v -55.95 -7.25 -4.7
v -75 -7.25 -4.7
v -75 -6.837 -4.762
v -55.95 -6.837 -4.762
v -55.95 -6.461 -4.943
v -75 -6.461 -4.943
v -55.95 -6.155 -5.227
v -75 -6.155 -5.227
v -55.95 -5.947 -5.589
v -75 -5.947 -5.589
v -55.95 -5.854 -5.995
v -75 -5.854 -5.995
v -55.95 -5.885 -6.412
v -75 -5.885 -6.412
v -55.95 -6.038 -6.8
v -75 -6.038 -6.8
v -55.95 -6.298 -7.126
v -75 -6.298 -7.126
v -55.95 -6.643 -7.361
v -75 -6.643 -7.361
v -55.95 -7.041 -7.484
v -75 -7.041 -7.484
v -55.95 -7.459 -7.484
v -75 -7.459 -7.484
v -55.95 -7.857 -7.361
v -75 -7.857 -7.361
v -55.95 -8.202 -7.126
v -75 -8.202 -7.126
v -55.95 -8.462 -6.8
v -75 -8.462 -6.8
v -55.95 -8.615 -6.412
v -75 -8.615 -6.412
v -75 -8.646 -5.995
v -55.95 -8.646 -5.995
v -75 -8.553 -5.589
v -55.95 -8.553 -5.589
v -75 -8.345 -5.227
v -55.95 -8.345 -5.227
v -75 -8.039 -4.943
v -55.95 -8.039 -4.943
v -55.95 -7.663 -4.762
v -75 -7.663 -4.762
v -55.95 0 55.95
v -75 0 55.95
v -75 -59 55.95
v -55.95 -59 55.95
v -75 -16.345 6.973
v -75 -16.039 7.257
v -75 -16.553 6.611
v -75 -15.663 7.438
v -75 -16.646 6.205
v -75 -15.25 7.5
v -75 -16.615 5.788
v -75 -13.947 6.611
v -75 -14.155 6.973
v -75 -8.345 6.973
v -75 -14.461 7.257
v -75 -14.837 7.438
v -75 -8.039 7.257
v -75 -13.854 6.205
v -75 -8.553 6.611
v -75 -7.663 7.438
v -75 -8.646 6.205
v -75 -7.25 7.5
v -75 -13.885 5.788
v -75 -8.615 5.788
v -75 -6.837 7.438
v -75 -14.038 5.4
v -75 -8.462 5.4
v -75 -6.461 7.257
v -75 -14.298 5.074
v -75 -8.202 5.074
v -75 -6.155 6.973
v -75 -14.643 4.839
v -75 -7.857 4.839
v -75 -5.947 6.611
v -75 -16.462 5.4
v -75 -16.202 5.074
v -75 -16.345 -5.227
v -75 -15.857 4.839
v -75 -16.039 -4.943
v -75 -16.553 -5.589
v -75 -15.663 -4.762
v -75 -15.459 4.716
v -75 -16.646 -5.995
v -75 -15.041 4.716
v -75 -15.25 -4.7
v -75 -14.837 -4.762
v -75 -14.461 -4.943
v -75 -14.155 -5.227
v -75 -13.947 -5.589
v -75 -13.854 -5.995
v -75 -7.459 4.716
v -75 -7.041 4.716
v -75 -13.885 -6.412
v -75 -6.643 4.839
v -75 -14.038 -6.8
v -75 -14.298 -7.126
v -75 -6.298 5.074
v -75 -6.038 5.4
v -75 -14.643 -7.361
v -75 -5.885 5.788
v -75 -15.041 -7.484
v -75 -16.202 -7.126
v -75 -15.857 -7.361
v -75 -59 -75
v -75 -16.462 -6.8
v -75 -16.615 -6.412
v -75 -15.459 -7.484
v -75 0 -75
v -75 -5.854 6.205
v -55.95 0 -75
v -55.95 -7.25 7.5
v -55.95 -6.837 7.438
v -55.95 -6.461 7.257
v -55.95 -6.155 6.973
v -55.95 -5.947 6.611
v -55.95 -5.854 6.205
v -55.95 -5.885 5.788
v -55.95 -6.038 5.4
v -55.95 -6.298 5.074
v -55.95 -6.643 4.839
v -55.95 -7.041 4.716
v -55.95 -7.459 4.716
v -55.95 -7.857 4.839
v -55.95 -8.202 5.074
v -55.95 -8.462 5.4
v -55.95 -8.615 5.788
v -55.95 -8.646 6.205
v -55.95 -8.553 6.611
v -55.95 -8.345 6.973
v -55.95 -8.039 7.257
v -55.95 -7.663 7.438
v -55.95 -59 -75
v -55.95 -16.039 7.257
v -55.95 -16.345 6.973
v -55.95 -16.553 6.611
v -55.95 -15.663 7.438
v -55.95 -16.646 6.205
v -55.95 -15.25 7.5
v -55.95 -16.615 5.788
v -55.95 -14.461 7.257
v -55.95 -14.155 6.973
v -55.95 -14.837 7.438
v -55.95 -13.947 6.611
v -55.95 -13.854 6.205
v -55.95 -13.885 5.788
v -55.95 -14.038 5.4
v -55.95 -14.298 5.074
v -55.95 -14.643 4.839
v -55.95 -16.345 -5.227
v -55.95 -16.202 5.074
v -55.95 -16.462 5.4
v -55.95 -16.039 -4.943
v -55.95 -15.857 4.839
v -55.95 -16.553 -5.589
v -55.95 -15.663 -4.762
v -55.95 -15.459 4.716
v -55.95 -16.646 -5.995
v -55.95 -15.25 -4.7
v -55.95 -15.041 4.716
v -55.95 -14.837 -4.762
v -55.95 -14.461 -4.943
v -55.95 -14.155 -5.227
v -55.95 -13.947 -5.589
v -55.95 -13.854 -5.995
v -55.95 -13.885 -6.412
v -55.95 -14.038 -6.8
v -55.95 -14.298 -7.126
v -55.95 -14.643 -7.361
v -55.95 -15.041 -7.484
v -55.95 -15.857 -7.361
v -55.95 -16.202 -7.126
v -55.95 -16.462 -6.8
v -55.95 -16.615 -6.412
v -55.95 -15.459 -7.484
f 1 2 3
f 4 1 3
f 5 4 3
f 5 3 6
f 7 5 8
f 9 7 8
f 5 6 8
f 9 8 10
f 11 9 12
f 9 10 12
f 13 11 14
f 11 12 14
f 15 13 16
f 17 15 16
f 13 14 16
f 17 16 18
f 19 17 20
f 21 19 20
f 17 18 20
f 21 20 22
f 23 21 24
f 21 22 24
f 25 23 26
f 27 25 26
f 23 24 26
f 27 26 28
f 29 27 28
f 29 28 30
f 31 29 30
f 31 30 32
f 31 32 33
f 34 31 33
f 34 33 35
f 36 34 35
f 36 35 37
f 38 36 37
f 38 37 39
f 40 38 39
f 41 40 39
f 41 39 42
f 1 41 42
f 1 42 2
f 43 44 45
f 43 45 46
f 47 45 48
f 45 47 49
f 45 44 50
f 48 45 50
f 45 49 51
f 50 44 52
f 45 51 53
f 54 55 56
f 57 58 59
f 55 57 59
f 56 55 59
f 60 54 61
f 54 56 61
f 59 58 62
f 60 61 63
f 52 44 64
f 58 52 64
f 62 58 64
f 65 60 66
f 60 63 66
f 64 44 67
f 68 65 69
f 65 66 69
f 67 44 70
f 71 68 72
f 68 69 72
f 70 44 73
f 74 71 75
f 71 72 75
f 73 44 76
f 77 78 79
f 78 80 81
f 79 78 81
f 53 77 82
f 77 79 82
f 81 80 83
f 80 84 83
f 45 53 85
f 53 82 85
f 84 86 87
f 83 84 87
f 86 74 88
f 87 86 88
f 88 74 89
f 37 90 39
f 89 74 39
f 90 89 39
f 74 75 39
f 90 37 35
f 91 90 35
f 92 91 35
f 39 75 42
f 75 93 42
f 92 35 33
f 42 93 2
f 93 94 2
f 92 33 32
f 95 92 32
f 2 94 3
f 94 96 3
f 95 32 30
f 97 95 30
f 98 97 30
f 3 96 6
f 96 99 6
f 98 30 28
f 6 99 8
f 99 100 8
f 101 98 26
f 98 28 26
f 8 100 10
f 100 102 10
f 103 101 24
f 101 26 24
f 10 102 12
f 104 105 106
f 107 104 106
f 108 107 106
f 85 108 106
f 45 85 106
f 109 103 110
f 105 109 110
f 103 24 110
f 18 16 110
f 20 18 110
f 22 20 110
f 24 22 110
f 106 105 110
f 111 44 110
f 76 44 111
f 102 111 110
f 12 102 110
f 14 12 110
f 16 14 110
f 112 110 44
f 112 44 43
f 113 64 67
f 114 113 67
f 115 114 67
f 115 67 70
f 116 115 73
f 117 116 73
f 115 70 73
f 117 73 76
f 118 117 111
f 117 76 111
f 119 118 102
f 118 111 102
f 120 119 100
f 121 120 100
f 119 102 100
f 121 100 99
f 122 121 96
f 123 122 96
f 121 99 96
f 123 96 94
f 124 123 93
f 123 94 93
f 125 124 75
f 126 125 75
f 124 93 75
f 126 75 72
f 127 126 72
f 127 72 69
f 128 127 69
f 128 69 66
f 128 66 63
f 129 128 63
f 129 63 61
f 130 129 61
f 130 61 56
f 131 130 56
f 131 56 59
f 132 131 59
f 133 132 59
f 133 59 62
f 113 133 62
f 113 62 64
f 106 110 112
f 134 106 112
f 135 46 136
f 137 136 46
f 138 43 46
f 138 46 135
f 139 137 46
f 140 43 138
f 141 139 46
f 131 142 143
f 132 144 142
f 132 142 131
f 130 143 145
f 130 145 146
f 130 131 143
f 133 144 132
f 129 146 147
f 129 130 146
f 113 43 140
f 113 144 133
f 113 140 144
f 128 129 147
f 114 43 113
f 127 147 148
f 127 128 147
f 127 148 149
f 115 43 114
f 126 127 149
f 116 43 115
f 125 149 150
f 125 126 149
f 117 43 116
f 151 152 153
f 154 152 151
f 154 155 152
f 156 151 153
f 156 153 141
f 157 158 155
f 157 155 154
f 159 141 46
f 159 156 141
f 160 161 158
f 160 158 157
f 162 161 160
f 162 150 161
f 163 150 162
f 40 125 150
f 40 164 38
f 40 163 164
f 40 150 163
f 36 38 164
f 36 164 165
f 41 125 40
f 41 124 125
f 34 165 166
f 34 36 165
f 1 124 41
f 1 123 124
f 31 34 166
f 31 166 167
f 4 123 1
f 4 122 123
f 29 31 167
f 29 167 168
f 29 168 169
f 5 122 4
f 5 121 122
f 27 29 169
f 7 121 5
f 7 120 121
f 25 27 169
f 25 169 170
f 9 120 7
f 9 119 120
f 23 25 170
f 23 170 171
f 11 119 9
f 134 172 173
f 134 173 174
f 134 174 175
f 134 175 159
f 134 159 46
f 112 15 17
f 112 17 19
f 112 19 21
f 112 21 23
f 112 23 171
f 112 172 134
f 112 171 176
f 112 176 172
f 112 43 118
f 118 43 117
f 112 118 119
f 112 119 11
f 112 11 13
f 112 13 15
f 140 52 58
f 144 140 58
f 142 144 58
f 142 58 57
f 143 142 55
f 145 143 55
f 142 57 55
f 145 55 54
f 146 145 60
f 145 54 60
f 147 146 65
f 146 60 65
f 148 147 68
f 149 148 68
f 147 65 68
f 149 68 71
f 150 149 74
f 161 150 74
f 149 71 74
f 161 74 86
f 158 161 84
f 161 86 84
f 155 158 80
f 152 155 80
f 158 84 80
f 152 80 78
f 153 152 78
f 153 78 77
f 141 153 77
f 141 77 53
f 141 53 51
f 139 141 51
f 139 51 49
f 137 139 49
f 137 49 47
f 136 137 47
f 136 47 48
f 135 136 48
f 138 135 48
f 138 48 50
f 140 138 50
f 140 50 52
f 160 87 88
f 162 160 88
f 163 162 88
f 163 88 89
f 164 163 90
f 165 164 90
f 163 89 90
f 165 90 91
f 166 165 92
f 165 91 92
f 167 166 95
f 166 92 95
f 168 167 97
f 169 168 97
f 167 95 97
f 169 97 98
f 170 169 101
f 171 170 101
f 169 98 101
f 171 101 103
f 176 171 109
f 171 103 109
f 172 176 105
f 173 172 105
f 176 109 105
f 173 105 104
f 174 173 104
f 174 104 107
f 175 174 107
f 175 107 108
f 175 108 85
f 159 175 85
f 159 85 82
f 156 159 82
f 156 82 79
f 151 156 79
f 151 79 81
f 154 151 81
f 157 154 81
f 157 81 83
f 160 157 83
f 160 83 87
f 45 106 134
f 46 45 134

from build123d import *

# Parameters (mm, degrees)
SKETCH1_W           = 150
SKETCH1_H           = 150
BOSS_EXTRUDE1_DEPTH = 59
SKETCH2_W           = 111.9
SKETCH2_H           = 111.9
CUT_EXTRUDE1_DEPTH  = 122.371331047
SKETCH9_R           = 1.4
CUT_EXTRUDE4_DEPTH  = 20
CIRPATTERN1_COUNT   = 3
CIRPATTERN1_ANGLE   = 180
SKETCH10_W          = 111.9
SKETCH10_H          = 105.448295943
CUT_EXTRUDE6_DEPTH  = 122.371331047
CUT_EXTRUDE7_DEPTH  = 122.371331047


with BuildPart() as part:
    # Sketch1 → Boss-Extrude1 (new body)
    with BuildSketch(Plane(origin=(0, 0, 0), x_dir=(1, 0, 0), z_dir=(0, 1, 0))):
        Rectangle(SKETCH1_W, SKETCH1_H)
    extrude(amount=-BOSS_EXTRUDE1_DEPTH)

    # Sketch2 → Cut-Extrude1 (cut, through all)
    with BuildSketch(Plane(origin=(0, 0, 0), x_dir=(1, 0, 0), z_dir=(0, 1, 0))):
        Rectangle(SKETCH2_W, SKETCH2_H)
    extrude(amount=-CUT_EXTRUDE1_DEPTH, mode=Mode.SUBTRACT)

    # Sketch9 → Cut-Extrude4 (cut)
    with BuildSketch(Plane.ZY.offset(75)):
        with Locations((-6.1, -7.25)):
            Circle(SKETCH9_R)
        with Locations((6.1, -7.25)):
            Circle(SKETCH9_R)
        with Locations((6.1, -15.25)):
            Circle(SKETCH9_R)
        with Locations((-6.1, -15.25)):
            Circle(SKETCH9_R)
    cut_extrude4 = extrude(amount=-CUT_EXTRUDE4_DEPTH, mode=Mode.SUBTRACT)

    # CirPattern1: Cut-Extrude4 ×3 about axis
    cirpattern1_axis = Axis((0, 0, 0), (0, 1, 0))
    for i in range(1, CIRPATTERN1_COUNT):
        add(cut_extrude4.rotate(cirpattern1_axis, i * CIRPATTERN1_ANGLE / (CIRPATTERN1_COUNT - 1)), mode=Mode.SUBTRACT)

    # Sketch10 → Cut-Extrude6 (cut, through all)
    with BuildSketch(Plane(origin=(0, 0, 0), x_dir=(1, 0, 0), z_dir=(0, 1, 0))):
        with Locations((0, 108.674147972)):
            Rectangle(SKETCH10_W, SKETCH10_H)
    extrude(amount=-CUT_EXTRUDE6_DEPTH, mode=Mode.SUBTRACT)

    # Sketch11 → Cut-Extrude7 (cut, through all)
    with BuildSketch(Plane(origin=(0, 0, 0), x_dir=(1, 0, 0), z_dir=(0, 1, 0))):
        Polygon((-55.95, -55.95), (-75, -55.95), (-75, -75), (75, -75), (75, 75), (-55.95, 75), align=None)
    extrude(amount=-CUT_EXTRUDE7_DEPTH, mode=Mode.SUBTRACT)


solid = part.part
